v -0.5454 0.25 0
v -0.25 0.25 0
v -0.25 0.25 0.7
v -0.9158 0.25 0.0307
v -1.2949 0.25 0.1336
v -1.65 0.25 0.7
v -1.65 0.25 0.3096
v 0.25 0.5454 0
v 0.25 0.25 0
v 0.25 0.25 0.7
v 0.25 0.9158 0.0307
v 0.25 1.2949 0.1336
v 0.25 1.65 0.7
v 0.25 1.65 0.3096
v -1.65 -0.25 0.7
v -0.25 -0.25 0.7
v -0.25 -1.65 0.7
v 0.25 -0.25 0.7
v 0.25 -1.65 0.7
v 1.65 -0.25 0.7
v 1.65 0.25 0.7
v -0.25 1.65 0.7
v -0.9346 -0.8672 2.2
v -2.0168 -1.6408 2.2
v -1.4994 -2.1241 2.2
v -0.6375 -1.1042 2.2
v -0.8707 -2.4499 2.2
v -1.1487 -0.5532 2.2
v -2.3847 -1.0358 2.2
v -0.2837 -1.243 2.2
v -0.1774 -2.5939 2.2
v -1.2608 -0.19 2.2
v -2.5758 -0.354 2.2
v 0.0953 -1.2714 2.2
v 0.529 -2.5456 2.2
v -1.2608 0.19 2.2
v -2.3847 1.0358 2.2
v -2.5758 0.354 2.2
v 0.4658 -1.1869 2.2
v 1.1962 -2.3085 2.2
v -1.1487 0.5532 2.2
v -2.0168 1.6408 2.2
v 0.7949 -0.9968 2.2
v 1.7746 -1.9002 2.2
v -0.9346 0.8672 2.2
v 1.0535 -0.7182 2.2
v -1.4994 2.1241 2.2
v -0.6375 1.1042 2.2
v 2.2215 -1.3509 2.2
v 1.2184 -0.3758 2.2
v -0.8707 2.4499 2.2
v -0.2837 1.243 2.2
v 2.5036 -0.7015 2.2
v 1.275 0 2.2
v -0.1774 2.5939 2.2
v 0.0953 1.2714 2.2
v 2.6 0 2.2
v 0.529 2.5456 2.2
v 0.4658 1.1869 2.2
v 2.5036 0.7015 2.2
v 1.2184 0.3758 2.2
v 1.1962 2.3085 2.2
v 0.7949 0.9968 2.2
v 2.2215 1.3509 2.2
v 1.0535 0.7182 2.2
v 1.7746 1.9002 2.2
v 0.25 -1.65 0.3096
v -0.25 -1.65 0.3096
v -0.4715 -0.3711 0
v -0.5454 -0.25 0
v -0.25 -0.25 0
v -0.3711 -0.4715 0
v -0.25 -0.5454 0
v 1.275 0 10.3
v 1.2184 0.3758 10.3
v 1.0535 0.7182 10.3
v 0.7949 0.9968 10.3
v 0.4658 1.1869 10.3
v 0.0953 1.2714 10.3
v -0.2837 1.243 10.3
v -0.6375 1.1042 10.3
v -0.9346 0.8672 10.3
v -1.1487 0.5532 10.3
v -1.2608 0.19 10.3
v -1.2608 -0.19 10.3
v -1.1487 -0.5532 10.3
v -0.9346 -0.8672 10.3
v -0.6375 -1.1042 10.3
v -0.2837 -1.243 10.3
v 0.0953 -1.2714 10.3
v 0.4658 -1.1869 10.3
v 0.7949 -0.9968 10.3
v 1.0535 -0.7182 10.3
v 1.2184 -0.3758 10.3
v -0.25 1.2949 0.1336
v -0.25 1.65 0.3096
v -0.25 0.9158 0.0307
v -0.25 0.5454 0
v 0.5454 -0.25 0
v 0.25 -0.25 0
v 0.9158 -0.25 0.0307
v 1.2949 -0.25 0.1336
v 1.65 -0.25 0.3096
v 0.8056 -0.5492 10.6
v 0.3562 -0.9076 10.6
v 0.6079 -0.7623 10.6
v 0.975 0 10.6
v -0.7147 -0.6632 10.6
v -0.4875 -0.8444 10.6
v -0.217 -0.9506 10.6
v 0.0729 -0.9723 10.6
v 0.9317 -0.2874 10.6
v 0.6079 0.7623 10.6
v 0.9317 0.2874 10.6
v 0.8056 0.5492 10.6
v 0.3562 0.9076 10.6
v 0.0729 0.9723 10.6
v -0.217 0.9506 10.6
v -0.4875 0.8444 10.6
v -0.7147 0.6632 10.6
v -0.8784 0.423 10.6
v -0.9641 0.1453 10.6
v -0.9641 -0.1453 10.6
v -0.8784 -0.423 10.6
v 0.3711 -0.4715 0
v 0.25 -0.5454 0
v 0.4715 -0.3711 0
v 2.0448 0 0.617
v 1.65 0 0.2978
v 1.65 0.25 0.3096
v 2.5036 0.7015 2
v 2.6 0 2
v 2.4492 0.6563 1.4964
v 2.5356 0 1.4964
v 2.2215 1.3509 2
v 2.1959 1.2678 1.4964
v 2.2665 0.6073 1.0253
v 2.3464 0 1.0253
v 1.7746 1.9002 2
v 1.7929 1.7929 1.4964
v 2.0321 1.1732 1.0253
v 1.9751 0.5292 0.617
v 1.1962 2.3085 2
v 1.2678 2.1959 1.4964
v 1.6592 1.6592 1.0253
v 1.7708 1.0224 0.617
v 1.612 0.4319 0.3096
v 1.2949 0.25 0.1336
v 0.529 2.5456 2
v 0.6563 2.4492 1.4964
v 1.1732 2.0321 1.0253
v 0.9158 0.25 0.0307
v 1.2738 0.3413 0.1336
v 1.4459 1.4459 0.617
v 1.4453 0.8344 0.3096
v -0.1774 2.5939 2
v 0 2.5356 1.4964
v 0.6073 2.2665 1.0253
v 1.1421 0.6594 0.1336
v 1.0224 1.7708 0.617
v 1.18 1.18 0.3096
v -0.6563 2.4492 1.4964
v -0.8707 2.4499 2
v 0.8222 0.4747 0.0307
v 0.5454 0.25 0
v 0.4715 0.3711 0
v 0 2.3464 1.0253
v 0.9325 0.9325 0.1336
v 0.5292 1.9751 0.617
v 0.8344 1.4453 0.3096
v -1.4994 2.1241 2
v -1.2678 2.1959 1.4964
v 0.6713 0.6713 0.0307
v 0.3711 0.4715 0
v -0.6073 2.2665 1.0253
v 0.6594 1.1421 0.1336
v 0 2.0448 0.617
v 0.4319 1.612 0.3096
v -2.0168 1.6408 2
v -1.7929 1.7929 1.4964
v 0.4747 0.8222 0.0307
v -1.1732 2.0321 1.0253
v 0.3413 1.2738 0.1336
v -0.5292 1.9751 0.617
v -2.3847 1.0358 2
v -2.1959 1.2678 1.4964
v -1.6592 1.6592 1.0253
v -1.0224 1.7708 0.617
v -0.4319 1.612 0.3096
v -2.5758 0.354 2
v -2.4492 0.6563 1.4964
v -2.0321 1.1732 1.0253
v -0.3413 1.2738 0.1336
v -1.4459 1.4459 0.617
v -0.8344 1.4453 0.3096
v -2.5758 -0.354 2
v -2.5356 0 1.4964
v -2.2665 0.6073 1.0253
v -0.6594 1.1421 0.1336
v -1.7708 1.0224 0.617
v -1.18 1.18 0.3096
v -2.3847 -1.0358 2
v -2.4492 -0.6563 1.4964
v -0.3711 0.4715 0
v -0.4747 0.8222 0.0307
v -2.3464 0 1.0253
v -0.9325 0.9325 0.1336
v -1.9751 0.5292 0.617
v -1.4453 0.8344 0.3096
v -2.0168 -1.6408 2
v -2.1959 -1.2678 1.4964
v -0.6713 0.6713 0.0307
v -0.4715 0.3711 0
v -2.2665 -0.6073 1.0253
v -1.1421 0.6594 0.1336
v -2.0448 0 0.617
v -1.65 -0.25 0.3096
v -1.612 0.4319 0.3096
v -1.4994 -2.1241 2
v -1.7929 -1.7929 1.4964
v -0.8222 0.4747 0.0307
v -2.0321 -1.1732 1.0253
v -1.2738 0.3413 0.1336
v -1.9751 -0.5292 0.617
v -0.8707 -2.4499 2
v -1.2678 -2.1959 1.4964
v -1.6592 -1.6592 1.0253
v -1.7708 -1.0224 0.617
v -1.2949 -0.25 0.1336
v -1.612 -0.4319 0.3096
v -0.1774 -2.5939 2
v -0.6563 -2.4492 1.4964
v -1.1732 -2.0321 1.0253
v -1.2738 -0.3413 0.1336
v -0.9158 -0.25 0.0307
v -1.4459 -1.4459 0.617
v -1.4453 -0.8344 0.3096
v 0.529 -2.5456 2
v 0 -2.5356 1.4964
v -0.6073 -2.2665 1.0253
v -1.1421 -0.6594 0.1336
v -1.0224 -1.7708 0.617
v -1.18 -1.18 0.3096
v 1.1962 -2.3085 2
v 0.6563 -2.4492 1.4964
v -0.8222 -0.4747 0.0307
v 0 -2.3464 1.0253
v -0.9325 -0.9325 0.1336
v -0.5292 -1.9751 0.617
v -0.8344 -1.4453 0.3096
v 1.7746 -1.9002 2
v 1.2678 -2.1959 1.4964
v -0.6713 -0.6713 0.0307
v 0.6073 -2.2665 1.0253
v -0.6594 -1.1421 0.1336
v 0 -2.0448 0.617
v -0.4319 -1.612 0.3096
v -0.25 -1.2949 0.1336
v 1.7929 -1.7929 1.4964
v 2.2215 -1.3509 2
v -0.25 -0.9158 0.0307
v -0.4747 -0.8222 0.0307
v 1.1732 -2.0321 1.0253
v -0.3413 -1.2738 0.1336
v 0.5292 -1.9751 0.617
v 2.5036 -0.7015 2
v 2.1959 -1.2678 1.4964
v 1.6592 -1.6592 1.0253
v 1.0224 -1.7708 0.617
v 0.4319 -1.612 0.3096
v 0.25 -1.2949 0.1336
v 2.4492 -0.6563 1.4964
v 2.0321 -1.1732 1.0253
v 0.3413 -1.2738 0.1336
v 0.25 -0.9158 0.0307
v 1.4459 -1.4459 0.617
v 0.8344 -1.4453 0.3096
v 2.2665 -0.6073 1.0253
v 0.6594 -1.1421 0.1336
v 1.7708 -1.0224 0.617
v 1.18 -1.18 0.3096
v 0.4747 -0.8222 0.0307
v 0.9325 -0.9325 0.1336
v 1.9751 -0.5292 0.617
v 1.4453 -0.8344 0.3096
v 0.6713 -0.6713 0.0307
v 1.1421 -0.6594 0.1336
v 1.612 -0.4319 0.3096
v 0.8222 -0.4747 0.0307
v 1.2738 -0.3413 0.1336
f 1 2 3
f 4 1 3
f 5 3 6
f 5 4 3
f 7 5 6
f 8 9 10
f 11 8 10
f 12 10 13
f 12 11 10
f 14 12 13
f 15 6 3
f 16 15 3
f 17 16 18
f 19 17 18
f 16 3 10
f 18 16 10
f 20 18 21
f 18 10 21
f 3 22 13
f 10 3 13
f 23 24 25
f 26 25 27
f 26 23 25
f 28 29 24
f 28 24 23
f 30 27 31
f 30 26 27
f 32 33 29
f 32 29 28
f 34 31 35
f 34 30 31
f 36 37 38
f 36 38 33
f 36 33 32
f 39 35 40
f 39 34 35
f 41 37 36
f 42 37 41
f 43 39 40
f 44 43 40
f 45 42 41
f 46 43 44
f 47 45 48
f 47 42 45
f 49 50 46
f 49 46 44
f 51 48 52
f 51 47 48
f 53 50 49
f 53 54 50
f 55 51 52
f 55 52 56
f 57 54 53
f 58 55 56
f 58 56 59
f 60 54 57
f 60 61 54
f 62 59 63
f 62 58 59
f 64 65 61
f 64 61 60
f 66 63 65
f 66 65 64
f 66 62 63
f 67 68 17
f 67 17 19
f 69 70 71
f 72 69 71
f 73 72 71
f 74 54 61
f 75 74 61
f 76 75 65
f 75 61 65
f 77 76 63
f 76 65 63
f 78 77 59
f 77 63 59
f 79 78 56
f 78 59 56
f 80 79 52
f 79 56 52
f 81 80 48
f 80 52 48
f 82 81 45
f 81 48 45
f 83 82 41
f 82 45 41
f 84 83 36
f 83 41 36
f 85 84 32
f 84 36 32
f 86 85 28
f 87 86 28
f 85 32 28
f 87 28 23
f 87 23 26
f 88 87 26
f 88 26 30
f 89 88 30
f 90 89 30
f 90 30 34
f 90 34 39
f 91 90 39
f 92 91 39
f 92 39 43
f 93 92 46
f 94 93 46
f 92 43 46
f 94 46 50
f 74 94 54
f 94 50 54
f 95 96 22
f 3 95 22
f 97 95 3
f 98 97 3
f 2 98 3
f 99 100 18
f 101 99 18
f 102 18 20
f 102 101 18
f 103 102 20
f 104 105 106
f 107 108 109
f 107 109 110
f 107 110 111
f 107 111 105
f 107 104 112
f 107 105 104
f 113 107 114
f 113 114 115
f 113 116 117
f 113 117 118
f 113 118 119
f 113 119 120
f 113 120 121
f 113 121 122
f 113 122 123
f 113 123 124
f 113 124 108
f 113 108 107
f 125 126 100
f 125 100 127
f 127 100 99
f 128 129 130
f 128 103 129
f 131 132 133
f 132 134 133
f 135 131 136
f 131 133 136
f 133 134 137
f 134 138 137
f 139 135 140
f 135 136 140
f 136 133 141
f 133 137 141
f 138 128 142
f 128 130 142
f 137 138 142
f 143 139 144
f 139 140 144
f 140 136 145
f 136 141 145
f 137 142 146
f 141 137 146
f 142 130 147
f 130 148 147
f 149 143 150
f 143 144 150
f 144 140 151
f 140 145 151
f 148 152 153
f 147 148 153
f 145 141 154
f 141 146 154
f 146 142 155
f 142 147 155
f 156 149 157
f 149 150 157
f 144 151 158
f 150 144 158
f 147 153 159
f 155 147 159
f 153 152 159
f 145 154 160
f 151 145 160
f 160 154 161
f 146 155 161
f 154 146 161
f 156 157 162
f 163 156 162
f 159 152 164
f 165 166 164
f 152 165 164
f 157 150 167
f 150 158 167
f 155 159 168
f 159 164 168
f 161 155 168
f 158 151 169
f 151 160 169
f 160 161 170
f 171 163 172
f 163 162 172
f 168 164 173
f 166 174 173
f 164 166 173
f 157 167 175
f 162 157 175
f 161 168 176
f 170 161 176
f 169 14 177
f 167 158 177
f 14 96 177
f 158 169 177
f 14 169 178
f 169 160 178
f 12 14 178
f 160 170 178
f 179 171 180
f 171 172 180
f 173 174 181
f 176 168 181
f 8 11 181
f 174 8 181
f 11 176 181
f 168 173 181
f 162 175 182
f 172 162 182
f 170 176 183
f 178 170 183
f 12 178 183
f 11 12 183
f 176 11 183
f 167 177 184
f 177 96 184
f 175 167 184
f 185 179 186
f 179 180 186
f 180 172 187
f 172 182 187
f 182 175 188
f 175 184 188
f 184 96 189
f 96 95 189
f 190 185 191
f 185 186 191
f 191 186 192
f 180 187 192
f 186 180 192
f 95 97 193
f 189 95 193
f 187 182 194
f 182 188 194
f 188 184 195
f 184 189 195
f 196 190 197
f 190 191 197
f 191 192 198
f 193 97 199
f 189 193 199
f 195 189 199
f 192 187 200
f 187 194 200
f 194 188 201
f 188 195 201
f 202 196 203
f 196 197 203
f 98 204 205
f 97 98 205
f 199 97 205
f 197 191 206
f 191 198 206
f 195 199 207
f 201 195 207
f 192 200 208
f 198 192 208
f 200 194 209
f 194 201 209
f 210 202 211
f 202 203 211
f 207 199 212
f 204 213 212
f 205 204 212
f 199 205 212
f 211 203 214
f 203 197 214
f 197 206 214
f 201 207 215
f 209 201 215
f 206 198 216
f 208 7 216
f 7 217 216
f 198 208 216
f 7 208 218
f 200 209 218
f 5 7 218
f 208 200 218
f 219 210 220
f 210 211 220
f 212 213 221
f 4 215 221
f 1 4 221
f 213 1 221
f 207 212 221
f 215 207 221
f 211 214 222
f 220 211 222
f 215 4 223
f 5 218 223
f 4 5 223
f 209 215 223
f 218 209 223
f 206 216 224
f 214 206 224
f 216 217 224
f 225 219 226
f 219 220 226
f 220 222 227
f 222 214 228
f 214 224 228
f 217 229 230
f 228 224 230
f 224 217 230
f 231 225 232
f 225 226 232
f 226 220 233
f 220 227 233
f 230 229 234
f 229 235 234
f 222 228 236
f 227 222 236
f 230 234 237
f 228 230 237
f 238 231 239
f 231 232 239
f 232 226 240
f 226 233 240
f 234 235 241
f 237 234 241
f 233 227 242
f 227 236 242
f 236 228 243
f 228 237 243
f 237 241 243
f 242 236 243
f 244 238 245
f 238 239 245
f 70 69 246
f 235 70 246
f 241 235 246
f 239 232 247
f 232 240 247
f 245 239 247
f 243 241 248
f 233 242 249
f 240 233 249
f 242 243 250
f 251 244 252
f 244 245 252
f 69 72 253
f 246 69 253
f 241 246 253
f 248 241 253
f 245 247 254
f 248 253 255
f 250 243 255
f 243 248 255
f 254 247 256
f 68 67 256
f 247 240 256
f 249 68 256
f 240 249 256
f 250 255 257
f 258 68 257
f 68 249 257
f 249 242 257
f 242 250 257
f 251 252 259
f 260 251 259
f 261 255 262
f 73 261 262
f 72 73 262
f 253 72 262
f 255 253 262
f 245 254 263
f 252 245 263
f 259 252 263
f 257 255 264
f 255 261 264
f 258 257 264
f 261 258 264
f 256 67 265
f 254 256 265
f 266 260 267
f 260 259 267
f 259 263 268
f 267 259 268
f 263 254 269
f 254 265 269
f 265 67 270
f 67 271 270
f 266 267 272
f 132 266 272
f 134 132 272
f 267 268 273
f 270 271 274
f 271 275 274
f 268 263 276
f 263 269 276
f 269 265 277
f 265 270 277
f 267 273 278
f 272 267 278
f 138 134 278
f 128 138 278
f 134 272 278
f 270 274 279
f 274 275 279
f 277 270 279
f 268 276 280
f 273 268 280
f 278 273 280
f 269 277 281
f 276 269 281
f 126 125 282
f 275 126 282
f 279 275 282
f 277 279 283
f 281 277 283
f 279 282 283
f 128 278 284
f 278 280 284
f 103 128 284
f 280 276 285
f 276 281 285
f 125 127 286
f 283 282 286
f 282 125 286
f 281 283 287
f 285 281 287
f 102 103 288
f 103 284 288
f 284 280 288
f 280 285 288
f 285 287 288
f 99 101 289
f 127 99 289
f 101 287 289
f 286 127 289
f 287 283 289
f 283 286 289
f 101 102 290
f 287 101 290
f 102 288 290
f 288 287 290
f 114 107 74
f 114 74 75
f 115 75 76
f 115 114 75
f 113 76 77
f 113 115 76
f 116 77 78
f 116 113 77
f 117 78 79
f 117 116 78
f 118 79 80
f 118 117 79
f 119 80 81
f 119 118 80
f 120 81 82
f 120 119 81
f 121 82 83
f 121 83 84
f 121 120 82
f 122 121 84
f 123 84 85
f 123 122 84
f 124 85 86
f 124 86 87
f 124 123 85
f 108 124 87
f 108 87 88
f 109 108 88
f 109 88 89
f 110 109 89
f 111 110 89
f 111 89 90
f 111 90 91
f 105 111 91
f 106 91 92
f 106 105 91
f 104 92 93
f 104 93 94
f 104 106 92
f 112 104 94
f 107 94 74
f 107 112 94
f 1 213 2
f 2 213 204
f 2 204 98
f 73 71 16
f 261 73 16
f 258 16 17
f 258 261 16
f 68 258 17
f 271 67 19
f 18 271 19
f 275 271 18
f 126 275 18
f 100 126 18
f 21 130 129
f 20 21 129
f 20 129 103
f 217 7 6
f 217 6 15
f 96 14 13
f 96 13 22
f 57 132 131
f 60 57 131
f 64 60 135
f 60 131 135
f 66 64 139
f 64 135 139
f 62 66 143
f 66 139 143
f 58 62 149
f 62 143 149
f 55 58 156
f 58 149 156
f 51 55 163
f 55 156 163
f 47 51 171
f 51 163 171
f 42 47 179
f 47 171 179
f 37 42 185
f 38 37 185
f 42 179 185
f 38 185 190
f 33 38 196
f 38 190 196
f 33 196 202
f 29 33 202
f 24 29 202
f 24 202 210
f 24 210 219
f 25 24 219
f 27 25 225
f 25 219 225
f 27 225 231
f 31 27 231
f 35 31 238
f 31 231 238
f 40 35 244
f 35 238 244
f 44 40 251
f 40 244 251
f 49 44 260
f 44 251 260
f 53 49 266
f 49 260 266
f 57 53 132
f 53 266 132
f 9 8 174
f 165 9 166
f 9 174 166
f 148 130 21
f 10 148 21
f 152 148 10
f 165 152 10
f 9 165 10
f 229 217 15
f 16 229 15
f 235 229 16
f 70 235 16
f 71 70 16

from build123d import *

# Parameters (mm, degrees)
SKICA1_R                 = 2.6
P_IDAT_VYSUNUT_M1_DEPTH  = 2.2
SKICA2_R                 = 1.275
P_IDAT_VYSUNUT_M2_DEPTH  = 8.4
ZAOBLIT1_R               = 2
ODEBRAT_VYSUNUT_M1_DEPTH = 0.7
ZKOSEN_1_SIZE            = 0.3


with BuildPart() as part:
    # Skica1 → Přidat vysunutím1 (new body)
    with BuildSketch(Plane.XY):
        Circle(SKICA1_R)
    extrude(amount=P_IDAT_VYSUNUT_M1_DEPTH)

    # Skica2 → Přidat vysunutím2 (add)
    with BuildSketch(Plane.XY.offset(2.2)):
        Circle(SKICA2_R)
    extrude(amount=P_IDAT_VYSUNUT_M2_DEPTH)

    # Zaoblit1
    zaoblit1_edges = [part.edges().sort_by_distance(p)[0] for p in [
        (-2.6, 0, 0),
    ]]
    fillet(zaoblit1_edges, radius=ZAOBLIT1_R)

    # Skica3 → Odebrat vysunutím1 (cut)
    with BuildSketch(Plane(origin=(0, 0, 0), x_dir=(-1, 0, 0), z_dir=(0, 0, -1))):
        Polygon((-1.65, 0), (-1.65, 0.25), (-0.25, 0.25), (-0.25, 1.65), (0.25, 1.65), (0.25, 0.25), (1.65, 0.25), (1.65, -0.25), (0.25, -0.25), (0.25, -1.65), (-0.25, -1.65), (-0.25, -0.25), (-1.65, -0.25), align=None)
    extrude(amount=-ODEBRAT_VYSUNUT_M1_DEPTH, mode=Mode.SUBTRACT)

    # Zkosení1
    zkosen_1_edges = [part.edges().sort_by_distance(p)[0] for p in [
        (-1.275, 0, 10.6),
    ]]
    chamfer(zkosen_1_edges, length=ZKOSEN_1_SIZE)


solid = part.part
